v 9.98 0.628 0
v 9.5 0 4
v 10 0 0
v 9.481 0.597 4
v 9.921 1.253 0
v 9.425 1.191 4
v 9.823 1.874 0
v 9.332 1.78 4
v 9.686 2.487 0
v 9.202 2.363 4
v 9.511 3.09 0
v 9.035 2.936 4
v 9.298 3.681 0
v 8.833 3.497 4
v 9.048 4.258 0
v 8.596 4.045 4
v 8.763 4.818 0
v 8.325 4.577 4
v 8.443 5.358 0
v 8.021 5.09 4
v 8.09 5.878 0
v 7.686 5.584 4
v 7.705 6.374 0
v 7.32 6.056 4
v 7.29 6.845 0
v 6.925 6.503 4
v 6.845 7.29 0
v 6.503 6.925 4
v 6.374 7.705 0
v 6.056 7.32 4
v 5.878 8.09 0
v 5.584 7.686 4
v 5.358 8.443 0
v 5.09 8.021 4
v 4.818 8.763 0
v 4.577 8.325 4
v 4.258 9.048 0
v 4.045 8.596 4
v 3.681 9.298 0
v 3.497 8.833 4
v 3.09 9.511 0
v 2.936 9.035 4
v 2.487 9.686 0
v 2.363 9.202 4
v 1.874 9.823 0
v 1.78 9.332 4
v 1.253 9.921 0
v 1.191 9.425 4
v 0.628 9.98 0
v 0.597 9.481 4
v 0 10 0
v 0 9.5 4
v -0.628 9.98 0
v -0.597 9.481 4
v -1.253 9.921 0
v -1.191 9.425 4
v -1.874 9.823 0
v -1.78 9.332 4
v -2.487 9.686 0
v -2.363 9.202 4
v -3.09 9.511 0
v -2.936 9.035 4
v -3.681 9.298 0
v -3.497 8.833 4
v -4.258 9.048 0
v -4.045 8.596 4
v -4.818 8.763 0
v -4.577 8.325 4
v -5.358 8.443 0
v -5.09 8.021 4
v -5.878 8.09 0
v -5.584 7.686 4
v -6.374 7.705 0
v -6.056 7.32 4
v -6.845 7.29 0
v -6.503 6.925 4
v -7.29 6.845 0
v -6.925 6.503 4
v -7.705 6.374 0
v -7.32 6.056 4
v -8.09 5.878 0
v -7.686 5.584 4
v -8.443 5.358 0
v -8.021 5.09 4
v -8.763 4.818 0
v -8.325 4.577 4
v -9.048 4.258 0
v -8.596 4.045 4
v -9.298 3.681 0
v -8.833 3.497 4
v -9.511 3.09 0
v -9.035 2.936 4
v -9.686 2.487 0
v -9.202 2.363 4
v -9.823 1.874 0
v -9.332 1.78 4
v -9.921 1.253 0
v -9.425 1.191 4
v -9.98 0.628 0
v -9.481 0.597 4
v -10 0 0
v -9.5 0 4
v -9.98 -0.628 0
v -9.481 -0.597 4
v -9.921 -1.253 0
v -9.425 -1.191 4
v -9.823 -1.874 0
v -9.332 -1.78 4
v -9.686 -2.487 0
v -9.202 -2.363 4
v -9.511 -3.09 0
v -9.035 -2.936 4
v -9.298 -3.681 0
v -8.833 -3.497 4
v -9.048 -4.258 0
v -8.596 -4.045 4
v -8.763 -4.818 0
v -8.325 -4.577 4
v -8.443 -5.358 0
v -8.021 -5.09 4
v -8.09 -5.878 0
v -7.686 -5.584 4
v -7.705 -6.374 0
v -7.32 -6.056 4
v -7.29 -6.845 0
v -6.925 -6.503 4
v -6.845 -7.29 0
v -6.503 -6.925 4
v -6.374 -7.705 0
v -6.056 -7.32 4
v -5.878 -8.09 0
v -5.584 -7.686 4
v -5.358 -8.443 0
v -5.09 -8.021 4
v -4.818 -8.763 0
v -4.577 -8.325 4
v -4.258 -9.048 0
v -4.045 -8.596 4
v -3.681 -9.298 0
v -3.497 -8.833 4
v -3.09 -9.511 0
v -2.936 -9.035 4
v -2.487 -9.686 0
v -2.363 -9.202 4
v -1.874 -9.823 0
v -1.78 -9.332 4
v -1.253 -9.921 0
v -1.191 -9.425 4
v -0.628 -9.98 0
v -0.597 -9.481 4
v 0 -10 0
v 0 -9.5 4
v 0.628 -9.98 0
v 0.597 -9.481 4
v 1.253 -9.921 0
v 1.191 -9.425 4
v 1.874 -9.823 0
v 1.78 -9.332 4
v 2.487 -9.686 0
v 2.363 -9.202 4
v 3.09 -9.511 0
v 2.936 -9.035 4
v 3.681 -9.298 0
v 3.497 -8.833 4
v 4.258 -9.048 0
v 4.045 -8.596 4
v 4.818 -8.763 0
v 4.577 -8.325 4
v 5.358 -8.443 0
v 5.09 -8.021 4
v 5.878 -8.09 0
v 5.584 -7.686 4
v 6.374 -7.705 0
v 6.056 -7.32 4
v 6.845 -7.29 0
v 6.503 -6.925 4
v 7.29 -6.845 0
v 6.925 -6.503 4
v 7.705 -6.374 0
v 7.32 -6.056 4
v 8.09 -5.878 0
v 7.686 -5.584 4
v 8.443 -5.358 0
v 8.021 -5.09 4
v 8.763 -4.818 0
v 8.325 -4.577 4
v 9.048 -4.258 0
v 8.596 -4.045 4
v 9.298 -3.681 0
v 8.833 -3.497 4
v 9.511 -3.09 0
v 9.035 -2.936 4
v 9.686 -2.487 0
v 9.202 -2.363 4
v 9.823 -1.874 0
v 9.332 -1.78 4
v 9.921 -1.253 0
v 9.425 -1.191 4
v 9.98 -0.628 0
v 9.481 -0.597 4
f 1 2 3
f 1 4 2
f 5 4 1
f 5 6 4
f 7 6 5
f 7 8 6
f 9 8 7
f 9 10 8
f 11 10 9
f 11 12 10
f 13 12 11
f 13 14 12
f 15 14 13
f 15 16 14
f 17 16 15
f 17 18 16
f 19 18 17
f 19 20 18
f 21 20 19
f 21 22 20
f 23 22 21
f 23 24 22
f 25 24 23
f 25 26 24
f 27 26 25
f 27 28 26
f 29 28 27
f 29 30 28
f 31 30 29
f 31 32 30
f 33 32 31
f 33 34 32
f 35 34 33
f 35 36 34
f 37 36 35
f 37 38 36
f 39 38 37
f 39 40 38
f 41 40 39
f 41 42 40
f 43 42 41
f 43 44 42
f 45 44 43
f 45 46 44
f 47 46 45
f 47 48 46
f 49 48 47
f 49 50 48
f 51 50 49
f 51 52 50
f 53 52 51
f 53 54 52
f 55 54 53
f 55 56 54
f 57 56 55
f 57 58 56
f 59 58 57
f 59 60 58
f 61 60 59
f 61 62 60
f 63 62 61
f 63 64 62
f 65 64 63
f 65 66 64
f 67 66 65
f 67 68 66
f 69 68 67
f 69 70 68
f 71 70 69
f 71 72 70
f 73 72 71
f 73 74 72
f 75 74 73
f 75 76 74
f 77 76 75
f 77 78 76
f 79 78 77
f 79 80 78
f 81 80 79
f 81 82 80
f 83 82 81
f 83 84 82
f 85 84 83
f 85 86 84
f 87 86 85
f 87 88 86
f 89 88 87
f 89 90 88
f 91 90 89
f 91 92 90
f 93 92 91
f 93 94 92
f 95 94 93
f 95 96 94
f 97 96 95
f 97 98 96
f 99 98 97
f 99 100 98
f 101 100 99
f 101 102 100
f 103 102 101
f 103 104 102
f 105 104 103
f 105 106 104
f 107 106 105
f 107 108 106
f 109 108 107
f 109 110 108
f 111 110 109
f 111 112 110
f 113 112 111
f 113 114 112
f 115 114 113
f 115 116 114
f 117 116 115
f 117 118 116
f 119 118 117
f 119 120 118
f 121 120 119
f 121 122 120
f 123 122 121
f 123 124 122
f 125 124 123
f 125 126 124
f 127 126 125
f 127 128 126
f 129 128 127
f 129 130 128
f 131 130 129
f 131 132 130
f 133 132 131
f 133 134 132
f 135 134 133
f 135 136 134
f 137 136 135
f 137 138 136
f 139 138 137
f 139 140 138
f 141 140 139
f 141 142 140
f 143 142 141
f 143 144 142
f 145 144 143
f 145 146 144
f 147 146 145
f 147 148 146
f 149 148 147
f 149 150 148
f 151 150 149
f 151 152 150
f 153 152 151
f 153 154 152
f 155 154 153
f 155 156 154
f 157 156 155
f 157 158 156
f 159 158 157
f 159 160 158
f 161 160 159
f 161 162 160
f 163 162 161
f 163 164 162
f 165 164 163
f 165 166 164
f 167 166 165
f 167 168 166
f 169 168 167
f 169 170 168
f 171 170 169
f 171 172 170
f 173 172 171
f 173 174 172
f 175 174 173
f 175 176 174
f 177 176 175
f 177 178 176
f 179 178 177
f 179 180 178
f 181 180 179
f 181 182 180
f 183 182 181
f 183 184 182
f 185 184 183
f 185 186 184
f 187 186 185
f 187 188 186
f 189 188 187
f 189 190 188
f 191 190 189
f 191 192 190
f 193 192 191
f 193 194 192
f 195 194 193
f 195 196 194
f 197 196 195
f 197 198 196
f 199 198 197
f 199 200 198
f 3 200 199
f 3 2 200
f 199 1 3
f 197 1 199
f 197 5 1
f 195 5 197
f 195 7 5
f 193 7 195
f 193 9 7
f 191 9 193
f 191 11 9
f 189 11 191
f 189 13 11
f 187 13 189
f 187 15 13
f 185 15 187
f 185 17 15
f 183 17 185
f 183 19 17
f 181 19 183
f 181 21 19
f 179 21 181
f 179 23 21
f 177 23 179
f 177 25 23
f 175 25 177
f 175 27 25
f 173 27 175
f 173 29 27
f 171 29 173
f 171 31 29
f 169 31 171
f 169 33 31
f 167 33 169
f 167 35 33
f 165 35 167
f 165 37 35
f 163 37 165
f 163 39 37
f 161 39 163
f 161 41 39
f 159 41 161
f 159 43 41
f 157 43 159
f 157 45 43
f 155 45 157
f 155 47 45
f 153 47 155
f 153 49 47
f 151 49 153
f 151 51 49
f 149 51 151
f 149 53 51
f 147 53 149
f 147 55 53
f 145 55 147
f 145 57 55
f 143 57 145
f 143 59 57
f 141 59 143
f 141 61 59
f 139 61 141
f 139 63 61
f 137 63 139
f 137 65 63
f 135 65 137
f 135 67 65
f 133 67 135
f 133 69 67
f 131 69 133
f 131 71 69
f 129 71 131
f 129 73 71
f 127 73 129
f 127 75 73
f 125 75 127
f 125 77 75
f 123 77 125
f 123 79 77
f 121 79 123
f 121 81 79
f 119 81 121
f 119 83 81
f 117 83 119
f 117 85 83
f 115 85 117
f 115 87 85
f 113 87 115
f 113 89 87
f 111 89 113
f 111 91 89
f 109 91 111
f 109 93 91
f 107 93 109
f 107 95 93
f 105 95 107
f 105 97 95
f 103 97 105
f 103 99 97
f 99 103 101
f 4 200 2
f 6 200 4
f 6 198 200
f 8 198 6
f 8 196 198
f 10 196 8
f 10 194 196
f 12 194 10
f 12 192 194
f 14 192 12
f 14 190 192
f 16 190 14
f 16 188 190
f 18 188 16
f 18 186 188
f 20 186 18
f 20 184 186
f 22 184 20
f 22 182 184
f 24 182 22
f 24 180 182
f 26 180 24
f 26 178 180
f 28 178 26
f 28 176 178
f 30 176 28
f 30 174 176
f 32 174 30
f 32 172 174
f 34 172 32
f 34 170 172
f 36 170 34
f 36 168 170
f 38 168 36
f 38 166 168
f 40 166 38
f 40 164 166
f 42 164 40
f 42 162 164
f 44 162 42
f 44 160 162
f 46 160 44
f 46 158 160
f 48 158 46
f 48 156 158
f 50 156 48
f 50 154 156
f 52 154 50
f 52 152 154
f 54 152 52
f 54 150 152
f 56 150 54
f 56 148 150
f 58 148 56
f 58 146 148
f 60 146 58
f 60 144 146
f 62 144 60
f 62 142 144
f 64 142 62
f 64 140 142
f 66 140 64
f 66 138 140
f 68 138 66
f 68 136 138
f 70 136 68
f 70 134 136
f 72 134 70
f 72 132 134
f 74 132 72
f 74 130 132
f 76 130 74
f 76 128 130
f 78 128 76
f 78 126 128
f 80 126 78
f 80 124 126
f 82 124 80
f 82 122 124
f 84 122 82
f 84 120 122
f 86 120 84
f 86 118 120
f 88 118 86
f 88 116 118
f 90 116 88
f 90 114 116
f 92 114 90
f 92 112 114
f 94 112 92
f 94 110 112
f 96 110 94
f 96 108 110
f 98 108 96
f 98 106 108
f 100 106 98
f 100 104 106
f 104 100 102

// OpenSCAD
// file: ../build.scad
$build_id = "";

function building(filename) = is_undef(filename) ?
  !is_undef(build)
  : !is_undef(build) && build == filename;

function previewing() = !building();

module build(filename) {
  $build_id = filename;

  if(!is_undef(scad_build_scan) && scad_build_scan == true) {
    echo(str("scad_build_scan: ", filename));
  }
  else if(previewing() || build == filename) {
    children();
  }
}

module preview_row(spacing) {
  if(previewing()) {
    for(x = [0:1:$children - 1]) {
      translate([x * spacing, 0, 0]) {
        children(x);
      }
    }
  }
  else {
    children();
  }
}

module preview_column(spacing) {
  if(previewing()) {
    for(y = [0:1:$children - 1]) {
      translate([0, y * spacing, 0]) {
        children(y);
      }
    }
  }
  else {
    children();
  }
}
// file: ../minibase.scad
// Based off of titancraft's Customizable Miniature Base (CC0 1.0)
// https://www.thingiverse.com/thing:1112237

include <./build.scad>

$base_rim = 1; //	[1: tapered, 2: inclined, 3: flat]
// Number of sides:
$base_shape = 100; //	[30:Low-res Circle, 100: Hi-res Circle, 5:Pentagon, 6:Hexagon, 8:Octagon, 4:Square, 3:Triangle]

$base_diameter = 32;
$base_height = 4;
$base_slant = 95;

// Percentage:
$base_stretch = 100;

//(tapered base only)
$base_inner_circle_ratio = 40;

module tapered(r=40) {
  $base_rim = 1;
  $base_inner_circle_ratio = r;

  children();
}

module inclined() {
  $base_rim = 2;

  children();
}

module flat() {
  $base_rim = 3;

  children();
}

module shape(s) {
  $base_shape = s;

  children();
}

module diameter(d) {
  $base_diameter = d;

  children();
}

module height(h) {
  $base_height = h;

  children();
}

module slant(s) {
  $base_slant = s;

  children();
}

module stretch(s) {
  $base_stretch = s;

  children();
}

module base(id) {
  build(id) union() {
    radius = $base_diameter/2;
    scale([$base_stretch/100, 1, 1]){
      if ($base_rim == 1){
        // tapered base
        cyl1_height = $base_height * (1-$base_inner_circle_ratio/100);
        cylinder(cyl1_height, radius, radius * $base_slant/100, $fn=$base_shape);

        cyl2_radius = radius  * $base_slant/100 * .95;
        cyl2_height = $base_height - cyl1_height;

        translate([0, 0, cyl1_height]){
          cylinder(cyl2_height, cyl2_radius, cyl2_radius * $base_slant/100, $fn=$base_shape);
          cylinder(cyl2_height*.5, radius * $base_slant/100, cyl2_radius, $fn=$base_shape);
        }
      } else if ($base_rim == 2){
        // inclined base
        cylinder($base_height, radius, radius * $base_slant/100, $fn=$base_shape);
      } else if ($base_rim == 3){
        // flat base

        cylinder($base_height, radius, radius, $fn=$base_shape);
      }
    }
  }
}
// main file
include <../minibase.scad>

inclined() diameter(20) base("20mm-opr-infantry-small");
